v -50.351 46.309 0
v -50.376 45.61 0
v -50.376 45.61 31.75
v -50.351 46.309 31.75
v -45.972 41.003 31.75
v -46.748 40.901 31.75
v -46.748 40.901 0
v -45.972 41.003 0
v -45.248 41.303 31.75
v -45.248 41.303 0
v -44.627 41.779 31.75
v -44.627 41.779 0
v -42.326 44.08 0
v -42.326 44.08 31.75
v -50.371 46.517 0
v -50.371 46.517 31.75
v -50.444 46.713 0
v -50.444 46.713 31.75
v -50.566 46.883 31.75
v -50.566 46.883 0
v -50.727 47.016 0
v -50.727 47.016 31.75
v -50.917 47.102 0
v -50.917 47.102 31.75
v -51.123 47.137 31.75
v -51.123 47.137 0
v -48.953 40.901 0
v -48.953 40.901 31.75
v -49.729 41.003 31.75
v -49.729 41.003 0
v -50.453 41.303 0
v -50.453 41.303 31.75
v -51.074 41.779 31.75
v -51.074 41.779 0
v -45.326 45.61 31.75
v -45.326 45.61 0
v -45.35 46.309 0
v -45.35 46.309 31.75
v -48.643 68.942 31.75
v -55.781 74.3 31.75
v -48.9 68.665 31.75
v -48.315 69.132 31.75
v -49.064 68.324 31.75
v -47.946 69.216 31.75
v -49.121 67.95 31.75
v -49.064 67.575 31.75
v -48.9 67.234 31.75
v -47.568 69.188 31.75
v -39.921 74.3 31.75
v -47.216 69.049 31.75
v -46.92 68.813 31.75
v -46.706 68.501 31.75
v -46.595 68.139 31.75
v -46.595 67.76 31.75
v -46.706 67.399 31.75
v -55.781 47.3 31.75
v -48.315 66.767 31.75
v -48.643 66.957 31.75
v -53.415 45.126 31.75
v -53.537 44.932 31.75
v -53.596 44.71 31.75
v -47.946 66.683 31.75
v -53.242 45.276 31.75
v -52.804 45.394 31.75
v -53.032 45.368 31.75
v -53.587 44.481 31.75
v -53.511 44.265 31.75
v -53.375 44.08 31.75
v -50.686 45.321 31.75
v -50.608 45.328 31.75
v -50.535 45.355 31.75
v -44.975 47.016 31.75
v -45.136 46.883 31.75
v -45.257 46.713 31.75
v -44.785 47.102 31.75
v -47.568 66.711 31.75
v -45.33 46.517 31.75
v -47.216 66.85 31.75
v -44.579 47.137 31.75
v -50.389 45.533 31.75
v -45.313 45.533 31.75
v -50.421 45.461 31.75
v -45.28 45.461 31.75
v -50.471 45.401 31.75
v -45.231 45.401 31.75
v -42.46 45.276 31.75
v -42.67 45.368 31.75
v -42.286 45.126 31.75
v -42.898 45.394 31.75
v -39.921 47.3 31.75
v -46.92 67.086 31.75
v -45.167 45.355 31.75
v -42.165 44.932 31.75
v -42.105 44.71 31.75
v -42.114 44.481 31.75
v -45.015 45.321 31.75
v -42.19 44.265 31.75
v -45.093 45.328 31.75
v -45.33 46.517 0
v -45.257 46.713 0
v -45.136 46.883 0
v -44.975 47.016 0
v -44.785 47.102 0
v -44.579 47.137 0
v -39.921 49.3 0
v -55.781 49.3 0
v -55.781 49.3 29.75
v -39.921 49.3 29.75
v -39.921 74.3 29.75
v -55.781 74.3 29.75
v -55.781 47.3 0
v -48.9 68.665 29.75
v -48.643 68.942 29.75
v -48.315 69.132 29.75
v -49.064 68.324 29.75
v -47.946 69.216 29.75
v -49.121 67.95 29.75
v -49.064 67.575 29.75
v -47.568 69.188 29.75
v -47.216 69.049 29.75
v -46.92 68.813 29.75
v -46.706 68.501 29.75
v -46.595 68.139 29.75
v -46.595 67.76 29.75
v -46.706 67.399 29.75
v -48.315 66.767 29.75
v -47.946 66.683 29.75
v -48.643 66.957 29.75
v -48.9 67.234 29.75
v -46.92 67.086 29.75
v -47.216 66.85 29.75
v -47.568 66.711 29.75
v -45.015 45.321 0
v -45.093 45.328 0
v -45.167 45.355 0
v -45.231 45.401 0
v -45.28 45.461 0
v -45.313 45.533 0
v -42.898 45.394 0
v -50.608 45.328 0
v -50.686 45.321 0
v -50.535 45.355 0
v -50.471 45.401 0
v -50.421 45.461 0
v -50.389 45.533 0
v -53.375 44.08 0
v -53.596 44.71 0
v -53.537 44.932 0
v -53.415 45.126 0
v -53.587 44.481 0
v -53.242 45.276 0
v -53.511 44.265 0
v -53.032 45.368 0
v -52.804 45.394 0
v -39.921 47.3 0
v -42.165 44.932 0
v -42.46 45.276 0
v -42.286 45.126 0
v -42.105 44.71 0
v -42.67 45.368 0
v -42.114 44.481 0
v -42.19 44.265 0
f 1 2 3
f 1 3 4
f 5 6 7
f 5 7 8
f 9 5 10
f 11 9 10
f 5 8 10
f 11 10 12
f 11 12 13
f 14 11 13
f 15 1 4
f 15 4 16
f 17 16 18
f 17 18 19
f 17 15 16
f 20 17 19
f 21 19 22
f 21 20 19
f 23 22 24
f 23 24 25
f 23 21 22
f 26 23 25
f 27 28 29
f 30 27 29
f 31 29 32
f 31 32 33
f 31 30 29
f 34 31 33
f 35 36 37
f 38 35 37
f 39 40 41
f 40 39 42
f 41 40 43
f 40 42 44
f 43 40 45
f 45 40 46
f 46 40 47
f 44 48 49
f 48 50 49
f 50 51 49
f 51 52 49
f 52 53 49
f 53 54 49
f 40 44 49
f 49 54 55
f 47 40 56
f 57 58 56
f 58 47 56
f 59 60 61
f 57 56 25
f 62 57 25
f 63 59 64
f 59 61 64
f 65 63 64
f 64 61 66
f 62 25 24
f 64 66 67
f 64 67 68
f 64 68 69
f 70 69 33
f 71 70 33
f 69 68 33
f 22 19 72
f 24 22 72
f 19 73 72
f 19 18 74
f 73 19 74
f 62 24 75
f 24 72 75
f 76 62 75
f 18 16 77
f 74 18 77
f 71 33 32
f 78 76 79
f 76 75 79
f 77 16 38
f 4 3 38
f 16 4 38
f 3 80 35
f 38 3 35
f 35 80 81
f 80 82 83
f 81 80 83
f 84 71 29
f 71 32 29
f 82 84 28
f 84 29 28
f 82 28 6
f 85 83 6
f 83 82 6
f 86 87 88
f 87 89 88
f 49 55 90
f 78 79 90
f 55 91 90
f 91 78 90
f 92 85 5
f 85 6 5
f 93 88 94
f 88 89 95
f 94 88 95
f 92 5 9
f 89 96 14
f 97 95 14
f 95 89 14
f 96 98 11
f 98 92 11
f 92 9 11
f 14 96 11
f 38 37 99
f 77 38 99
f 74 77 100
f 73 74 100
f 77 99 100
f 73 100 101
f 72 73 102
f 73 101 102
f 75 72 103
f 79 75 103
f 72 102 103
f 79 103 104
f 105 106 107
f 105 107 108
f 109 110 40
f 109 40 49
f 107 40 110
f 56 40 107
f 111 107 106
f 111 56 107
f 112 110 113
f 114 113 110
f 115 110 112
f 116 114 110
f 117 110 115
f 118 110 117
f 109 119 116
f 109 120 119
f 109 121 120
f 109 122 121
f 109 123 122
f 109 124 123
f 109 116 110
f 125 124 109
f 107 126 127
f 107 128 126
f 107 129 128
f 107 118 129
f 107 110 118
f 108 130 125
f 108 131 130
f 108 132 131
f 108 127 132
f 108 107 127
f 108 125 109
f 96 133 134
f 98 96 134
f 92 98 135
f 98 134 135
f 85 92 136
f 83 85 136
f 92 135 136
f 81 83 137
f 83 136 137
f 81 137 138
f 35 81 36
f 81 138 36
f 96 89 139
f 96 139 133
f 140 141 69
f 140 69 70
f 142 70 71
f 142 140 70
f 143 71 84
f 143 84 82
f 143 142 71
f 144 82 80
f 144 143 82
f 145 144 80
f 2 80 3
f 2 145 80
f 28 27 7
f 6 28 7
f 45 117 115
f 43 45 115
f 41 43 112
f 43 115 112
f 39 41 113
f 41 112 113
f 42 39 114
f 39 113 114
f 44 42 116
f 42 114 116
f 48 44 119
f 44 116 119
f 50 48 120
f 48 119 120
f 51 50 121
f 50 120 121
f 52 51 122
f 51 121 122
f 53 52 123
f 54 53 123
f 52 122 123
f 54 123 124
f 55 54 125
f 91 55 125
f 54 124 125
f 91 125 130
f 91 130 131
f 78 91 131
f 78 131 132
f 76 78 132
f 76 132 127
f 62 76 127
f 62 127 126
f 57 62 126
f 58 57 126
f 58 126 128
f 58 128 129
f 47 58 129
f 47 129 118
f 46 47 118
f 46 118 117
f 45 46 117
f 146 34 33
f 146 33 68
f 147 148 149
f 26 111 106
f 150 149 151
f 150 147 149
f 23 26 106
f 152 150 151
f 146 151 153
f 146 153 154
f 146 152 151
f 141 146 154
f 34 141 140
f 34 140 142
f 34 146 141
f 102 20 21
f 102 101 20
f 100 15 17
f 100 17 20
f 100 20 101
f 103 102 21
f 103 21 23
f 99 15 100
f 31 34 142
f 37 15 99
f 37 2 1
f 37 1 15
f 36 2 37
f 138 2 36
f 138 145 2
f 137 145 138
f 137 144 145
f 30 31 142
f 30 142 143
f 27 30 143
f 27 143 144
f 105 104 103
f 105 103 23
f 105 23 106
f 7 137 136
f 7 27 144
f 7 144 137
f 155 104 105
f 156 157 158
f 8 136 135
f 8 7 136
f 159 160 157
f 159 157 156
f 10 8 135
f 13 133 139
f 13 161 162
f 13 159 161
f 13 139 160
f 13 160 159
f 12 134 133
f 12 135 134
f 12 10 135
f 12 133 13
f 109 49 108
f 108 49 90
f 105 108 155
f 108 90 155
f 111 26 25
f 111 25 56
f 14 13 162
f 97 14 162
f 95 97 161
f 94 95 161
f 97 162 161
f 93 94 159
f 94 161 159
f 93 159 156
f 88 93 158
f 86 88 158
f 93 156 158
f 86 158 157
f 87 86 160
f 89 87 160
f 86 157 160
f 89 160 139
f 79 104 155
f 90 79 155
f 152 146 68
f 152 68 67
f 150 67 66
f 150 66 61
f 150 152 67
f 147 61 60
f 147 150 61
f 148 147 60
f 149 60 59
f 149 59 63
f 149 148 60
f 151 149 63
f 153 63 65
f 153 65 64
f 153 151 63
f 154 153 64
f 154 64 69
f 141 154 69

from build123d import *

# Parameters (mm, degrees)
BOSS_EXTRUDE1_DEPTH = 31.75
SKETCH19_W          = 15.860402013
SKETCH19_H          = 31.75
BOSS_EXTRUDE7_DEPTH = 2
SKETCH23_W          = 15.860402013
SKETCH23_H          = 2
BOSS_EXTRUDE8_DEPTH = 25
SKETCH24_R          = 1.27
CUT_EXTRUDE1_DEPTH  = 2.54


with BuildPart() as part:
    # Sketch2 → Boss-Extrude1 (new body)
    with BuildSketch(Plane.XY):
        with BuildLine():
            Line((-50.375618534, 45.609862895), (-50.351188886, 46.309436474))
            ThreePointArc((-50.351188886, 46.309436474), (-50.565618587, 46.88295476), (-51.12278195, 47.136868733))
            Line((-51.12278195, 47.136868733), (-55.780902554, 47.299533889))
            Line((-55.780902554, 47.299533889), (-47.850701548, 47.299533889))
            Line((-47.850701548, 47.299533889), (-47.850701548, 40.900752235))
            Line((-47.850701548, 40.900752235), (-48.952946324, 40.900752235))
            ThreePointArc((-48.952946324, 40.900752235), (-50.100996621, 41.129113637), (-51.074266668, 41.779431891))
            Line((-51.074266668, 41.779431891), (-53.375146928, 44.080312152))
            ThreePointArc((-53.375146928, 44.080312152), (-53.536830204, 44.931922499), (-52.803734096, 45.394471696))
            Line((-52.803734096, 45.394471696), (-50.685905631, 45.320515496))
            ThreePointArc((-50.685905631, 45.320515496), (-50.470836274, 45.400926634), (-50.375618534, 45.609862895))
        make_face()
    boss_extrude1 = extrude(amount=BOSS_EXTRUDE1_DEPTH)

    # Mirror2: Boss-Extrude1 across plane
    add(boss_extrude1.mirror(Plane(origin=(-47.850701548, 40.900752235, 31.75), x_dir=(0, 0, 1), z_dir=(-1, 0, 0))))

    # Sketch19 → Boss-Extrude7 (add)
    with BuildSketch(Plane(origin=(0, 47.299533889, 0), x_dir=(1, 0, 0), z_dir=(0, 1, 0))):
        with Locations((-47.850701548, -15.875)):
            Rectangle(SKETCH19_W, SKETCH19_H)
    extrude(amount=BOSS_EXTRUDE7_DEPTH)

    # Sketch23 → Boss-Extrude8 (add)
    with BuildSketch(Plane(origin=(0, 49.299533889, 0), x_dir=(1, 0, 0), z_dir=(0, 1, 0))):
        with Locations((-47.850701548, -30.75)):
            Rectangle(SKETCH23_W, SKETCH23_H)
    extrude(amount=BOSS_EXTRUDE8_DEPTH)

    # Sketch24 → Cut-Extrude1 (cut)
    with BuildSketch(Plane(origin=(0, 0, 29.75), x_dir=(-1, 0, 0), z_dir=(0, 0, -1))):
        with Locations((47.850701548, 67.949533889)):
            Circle(SKETCH24_R)
    extrude(amount=-CUT_EXTRUDE1_DEPTH, mode=Mode.SUBTRACT)


solid = part.part
